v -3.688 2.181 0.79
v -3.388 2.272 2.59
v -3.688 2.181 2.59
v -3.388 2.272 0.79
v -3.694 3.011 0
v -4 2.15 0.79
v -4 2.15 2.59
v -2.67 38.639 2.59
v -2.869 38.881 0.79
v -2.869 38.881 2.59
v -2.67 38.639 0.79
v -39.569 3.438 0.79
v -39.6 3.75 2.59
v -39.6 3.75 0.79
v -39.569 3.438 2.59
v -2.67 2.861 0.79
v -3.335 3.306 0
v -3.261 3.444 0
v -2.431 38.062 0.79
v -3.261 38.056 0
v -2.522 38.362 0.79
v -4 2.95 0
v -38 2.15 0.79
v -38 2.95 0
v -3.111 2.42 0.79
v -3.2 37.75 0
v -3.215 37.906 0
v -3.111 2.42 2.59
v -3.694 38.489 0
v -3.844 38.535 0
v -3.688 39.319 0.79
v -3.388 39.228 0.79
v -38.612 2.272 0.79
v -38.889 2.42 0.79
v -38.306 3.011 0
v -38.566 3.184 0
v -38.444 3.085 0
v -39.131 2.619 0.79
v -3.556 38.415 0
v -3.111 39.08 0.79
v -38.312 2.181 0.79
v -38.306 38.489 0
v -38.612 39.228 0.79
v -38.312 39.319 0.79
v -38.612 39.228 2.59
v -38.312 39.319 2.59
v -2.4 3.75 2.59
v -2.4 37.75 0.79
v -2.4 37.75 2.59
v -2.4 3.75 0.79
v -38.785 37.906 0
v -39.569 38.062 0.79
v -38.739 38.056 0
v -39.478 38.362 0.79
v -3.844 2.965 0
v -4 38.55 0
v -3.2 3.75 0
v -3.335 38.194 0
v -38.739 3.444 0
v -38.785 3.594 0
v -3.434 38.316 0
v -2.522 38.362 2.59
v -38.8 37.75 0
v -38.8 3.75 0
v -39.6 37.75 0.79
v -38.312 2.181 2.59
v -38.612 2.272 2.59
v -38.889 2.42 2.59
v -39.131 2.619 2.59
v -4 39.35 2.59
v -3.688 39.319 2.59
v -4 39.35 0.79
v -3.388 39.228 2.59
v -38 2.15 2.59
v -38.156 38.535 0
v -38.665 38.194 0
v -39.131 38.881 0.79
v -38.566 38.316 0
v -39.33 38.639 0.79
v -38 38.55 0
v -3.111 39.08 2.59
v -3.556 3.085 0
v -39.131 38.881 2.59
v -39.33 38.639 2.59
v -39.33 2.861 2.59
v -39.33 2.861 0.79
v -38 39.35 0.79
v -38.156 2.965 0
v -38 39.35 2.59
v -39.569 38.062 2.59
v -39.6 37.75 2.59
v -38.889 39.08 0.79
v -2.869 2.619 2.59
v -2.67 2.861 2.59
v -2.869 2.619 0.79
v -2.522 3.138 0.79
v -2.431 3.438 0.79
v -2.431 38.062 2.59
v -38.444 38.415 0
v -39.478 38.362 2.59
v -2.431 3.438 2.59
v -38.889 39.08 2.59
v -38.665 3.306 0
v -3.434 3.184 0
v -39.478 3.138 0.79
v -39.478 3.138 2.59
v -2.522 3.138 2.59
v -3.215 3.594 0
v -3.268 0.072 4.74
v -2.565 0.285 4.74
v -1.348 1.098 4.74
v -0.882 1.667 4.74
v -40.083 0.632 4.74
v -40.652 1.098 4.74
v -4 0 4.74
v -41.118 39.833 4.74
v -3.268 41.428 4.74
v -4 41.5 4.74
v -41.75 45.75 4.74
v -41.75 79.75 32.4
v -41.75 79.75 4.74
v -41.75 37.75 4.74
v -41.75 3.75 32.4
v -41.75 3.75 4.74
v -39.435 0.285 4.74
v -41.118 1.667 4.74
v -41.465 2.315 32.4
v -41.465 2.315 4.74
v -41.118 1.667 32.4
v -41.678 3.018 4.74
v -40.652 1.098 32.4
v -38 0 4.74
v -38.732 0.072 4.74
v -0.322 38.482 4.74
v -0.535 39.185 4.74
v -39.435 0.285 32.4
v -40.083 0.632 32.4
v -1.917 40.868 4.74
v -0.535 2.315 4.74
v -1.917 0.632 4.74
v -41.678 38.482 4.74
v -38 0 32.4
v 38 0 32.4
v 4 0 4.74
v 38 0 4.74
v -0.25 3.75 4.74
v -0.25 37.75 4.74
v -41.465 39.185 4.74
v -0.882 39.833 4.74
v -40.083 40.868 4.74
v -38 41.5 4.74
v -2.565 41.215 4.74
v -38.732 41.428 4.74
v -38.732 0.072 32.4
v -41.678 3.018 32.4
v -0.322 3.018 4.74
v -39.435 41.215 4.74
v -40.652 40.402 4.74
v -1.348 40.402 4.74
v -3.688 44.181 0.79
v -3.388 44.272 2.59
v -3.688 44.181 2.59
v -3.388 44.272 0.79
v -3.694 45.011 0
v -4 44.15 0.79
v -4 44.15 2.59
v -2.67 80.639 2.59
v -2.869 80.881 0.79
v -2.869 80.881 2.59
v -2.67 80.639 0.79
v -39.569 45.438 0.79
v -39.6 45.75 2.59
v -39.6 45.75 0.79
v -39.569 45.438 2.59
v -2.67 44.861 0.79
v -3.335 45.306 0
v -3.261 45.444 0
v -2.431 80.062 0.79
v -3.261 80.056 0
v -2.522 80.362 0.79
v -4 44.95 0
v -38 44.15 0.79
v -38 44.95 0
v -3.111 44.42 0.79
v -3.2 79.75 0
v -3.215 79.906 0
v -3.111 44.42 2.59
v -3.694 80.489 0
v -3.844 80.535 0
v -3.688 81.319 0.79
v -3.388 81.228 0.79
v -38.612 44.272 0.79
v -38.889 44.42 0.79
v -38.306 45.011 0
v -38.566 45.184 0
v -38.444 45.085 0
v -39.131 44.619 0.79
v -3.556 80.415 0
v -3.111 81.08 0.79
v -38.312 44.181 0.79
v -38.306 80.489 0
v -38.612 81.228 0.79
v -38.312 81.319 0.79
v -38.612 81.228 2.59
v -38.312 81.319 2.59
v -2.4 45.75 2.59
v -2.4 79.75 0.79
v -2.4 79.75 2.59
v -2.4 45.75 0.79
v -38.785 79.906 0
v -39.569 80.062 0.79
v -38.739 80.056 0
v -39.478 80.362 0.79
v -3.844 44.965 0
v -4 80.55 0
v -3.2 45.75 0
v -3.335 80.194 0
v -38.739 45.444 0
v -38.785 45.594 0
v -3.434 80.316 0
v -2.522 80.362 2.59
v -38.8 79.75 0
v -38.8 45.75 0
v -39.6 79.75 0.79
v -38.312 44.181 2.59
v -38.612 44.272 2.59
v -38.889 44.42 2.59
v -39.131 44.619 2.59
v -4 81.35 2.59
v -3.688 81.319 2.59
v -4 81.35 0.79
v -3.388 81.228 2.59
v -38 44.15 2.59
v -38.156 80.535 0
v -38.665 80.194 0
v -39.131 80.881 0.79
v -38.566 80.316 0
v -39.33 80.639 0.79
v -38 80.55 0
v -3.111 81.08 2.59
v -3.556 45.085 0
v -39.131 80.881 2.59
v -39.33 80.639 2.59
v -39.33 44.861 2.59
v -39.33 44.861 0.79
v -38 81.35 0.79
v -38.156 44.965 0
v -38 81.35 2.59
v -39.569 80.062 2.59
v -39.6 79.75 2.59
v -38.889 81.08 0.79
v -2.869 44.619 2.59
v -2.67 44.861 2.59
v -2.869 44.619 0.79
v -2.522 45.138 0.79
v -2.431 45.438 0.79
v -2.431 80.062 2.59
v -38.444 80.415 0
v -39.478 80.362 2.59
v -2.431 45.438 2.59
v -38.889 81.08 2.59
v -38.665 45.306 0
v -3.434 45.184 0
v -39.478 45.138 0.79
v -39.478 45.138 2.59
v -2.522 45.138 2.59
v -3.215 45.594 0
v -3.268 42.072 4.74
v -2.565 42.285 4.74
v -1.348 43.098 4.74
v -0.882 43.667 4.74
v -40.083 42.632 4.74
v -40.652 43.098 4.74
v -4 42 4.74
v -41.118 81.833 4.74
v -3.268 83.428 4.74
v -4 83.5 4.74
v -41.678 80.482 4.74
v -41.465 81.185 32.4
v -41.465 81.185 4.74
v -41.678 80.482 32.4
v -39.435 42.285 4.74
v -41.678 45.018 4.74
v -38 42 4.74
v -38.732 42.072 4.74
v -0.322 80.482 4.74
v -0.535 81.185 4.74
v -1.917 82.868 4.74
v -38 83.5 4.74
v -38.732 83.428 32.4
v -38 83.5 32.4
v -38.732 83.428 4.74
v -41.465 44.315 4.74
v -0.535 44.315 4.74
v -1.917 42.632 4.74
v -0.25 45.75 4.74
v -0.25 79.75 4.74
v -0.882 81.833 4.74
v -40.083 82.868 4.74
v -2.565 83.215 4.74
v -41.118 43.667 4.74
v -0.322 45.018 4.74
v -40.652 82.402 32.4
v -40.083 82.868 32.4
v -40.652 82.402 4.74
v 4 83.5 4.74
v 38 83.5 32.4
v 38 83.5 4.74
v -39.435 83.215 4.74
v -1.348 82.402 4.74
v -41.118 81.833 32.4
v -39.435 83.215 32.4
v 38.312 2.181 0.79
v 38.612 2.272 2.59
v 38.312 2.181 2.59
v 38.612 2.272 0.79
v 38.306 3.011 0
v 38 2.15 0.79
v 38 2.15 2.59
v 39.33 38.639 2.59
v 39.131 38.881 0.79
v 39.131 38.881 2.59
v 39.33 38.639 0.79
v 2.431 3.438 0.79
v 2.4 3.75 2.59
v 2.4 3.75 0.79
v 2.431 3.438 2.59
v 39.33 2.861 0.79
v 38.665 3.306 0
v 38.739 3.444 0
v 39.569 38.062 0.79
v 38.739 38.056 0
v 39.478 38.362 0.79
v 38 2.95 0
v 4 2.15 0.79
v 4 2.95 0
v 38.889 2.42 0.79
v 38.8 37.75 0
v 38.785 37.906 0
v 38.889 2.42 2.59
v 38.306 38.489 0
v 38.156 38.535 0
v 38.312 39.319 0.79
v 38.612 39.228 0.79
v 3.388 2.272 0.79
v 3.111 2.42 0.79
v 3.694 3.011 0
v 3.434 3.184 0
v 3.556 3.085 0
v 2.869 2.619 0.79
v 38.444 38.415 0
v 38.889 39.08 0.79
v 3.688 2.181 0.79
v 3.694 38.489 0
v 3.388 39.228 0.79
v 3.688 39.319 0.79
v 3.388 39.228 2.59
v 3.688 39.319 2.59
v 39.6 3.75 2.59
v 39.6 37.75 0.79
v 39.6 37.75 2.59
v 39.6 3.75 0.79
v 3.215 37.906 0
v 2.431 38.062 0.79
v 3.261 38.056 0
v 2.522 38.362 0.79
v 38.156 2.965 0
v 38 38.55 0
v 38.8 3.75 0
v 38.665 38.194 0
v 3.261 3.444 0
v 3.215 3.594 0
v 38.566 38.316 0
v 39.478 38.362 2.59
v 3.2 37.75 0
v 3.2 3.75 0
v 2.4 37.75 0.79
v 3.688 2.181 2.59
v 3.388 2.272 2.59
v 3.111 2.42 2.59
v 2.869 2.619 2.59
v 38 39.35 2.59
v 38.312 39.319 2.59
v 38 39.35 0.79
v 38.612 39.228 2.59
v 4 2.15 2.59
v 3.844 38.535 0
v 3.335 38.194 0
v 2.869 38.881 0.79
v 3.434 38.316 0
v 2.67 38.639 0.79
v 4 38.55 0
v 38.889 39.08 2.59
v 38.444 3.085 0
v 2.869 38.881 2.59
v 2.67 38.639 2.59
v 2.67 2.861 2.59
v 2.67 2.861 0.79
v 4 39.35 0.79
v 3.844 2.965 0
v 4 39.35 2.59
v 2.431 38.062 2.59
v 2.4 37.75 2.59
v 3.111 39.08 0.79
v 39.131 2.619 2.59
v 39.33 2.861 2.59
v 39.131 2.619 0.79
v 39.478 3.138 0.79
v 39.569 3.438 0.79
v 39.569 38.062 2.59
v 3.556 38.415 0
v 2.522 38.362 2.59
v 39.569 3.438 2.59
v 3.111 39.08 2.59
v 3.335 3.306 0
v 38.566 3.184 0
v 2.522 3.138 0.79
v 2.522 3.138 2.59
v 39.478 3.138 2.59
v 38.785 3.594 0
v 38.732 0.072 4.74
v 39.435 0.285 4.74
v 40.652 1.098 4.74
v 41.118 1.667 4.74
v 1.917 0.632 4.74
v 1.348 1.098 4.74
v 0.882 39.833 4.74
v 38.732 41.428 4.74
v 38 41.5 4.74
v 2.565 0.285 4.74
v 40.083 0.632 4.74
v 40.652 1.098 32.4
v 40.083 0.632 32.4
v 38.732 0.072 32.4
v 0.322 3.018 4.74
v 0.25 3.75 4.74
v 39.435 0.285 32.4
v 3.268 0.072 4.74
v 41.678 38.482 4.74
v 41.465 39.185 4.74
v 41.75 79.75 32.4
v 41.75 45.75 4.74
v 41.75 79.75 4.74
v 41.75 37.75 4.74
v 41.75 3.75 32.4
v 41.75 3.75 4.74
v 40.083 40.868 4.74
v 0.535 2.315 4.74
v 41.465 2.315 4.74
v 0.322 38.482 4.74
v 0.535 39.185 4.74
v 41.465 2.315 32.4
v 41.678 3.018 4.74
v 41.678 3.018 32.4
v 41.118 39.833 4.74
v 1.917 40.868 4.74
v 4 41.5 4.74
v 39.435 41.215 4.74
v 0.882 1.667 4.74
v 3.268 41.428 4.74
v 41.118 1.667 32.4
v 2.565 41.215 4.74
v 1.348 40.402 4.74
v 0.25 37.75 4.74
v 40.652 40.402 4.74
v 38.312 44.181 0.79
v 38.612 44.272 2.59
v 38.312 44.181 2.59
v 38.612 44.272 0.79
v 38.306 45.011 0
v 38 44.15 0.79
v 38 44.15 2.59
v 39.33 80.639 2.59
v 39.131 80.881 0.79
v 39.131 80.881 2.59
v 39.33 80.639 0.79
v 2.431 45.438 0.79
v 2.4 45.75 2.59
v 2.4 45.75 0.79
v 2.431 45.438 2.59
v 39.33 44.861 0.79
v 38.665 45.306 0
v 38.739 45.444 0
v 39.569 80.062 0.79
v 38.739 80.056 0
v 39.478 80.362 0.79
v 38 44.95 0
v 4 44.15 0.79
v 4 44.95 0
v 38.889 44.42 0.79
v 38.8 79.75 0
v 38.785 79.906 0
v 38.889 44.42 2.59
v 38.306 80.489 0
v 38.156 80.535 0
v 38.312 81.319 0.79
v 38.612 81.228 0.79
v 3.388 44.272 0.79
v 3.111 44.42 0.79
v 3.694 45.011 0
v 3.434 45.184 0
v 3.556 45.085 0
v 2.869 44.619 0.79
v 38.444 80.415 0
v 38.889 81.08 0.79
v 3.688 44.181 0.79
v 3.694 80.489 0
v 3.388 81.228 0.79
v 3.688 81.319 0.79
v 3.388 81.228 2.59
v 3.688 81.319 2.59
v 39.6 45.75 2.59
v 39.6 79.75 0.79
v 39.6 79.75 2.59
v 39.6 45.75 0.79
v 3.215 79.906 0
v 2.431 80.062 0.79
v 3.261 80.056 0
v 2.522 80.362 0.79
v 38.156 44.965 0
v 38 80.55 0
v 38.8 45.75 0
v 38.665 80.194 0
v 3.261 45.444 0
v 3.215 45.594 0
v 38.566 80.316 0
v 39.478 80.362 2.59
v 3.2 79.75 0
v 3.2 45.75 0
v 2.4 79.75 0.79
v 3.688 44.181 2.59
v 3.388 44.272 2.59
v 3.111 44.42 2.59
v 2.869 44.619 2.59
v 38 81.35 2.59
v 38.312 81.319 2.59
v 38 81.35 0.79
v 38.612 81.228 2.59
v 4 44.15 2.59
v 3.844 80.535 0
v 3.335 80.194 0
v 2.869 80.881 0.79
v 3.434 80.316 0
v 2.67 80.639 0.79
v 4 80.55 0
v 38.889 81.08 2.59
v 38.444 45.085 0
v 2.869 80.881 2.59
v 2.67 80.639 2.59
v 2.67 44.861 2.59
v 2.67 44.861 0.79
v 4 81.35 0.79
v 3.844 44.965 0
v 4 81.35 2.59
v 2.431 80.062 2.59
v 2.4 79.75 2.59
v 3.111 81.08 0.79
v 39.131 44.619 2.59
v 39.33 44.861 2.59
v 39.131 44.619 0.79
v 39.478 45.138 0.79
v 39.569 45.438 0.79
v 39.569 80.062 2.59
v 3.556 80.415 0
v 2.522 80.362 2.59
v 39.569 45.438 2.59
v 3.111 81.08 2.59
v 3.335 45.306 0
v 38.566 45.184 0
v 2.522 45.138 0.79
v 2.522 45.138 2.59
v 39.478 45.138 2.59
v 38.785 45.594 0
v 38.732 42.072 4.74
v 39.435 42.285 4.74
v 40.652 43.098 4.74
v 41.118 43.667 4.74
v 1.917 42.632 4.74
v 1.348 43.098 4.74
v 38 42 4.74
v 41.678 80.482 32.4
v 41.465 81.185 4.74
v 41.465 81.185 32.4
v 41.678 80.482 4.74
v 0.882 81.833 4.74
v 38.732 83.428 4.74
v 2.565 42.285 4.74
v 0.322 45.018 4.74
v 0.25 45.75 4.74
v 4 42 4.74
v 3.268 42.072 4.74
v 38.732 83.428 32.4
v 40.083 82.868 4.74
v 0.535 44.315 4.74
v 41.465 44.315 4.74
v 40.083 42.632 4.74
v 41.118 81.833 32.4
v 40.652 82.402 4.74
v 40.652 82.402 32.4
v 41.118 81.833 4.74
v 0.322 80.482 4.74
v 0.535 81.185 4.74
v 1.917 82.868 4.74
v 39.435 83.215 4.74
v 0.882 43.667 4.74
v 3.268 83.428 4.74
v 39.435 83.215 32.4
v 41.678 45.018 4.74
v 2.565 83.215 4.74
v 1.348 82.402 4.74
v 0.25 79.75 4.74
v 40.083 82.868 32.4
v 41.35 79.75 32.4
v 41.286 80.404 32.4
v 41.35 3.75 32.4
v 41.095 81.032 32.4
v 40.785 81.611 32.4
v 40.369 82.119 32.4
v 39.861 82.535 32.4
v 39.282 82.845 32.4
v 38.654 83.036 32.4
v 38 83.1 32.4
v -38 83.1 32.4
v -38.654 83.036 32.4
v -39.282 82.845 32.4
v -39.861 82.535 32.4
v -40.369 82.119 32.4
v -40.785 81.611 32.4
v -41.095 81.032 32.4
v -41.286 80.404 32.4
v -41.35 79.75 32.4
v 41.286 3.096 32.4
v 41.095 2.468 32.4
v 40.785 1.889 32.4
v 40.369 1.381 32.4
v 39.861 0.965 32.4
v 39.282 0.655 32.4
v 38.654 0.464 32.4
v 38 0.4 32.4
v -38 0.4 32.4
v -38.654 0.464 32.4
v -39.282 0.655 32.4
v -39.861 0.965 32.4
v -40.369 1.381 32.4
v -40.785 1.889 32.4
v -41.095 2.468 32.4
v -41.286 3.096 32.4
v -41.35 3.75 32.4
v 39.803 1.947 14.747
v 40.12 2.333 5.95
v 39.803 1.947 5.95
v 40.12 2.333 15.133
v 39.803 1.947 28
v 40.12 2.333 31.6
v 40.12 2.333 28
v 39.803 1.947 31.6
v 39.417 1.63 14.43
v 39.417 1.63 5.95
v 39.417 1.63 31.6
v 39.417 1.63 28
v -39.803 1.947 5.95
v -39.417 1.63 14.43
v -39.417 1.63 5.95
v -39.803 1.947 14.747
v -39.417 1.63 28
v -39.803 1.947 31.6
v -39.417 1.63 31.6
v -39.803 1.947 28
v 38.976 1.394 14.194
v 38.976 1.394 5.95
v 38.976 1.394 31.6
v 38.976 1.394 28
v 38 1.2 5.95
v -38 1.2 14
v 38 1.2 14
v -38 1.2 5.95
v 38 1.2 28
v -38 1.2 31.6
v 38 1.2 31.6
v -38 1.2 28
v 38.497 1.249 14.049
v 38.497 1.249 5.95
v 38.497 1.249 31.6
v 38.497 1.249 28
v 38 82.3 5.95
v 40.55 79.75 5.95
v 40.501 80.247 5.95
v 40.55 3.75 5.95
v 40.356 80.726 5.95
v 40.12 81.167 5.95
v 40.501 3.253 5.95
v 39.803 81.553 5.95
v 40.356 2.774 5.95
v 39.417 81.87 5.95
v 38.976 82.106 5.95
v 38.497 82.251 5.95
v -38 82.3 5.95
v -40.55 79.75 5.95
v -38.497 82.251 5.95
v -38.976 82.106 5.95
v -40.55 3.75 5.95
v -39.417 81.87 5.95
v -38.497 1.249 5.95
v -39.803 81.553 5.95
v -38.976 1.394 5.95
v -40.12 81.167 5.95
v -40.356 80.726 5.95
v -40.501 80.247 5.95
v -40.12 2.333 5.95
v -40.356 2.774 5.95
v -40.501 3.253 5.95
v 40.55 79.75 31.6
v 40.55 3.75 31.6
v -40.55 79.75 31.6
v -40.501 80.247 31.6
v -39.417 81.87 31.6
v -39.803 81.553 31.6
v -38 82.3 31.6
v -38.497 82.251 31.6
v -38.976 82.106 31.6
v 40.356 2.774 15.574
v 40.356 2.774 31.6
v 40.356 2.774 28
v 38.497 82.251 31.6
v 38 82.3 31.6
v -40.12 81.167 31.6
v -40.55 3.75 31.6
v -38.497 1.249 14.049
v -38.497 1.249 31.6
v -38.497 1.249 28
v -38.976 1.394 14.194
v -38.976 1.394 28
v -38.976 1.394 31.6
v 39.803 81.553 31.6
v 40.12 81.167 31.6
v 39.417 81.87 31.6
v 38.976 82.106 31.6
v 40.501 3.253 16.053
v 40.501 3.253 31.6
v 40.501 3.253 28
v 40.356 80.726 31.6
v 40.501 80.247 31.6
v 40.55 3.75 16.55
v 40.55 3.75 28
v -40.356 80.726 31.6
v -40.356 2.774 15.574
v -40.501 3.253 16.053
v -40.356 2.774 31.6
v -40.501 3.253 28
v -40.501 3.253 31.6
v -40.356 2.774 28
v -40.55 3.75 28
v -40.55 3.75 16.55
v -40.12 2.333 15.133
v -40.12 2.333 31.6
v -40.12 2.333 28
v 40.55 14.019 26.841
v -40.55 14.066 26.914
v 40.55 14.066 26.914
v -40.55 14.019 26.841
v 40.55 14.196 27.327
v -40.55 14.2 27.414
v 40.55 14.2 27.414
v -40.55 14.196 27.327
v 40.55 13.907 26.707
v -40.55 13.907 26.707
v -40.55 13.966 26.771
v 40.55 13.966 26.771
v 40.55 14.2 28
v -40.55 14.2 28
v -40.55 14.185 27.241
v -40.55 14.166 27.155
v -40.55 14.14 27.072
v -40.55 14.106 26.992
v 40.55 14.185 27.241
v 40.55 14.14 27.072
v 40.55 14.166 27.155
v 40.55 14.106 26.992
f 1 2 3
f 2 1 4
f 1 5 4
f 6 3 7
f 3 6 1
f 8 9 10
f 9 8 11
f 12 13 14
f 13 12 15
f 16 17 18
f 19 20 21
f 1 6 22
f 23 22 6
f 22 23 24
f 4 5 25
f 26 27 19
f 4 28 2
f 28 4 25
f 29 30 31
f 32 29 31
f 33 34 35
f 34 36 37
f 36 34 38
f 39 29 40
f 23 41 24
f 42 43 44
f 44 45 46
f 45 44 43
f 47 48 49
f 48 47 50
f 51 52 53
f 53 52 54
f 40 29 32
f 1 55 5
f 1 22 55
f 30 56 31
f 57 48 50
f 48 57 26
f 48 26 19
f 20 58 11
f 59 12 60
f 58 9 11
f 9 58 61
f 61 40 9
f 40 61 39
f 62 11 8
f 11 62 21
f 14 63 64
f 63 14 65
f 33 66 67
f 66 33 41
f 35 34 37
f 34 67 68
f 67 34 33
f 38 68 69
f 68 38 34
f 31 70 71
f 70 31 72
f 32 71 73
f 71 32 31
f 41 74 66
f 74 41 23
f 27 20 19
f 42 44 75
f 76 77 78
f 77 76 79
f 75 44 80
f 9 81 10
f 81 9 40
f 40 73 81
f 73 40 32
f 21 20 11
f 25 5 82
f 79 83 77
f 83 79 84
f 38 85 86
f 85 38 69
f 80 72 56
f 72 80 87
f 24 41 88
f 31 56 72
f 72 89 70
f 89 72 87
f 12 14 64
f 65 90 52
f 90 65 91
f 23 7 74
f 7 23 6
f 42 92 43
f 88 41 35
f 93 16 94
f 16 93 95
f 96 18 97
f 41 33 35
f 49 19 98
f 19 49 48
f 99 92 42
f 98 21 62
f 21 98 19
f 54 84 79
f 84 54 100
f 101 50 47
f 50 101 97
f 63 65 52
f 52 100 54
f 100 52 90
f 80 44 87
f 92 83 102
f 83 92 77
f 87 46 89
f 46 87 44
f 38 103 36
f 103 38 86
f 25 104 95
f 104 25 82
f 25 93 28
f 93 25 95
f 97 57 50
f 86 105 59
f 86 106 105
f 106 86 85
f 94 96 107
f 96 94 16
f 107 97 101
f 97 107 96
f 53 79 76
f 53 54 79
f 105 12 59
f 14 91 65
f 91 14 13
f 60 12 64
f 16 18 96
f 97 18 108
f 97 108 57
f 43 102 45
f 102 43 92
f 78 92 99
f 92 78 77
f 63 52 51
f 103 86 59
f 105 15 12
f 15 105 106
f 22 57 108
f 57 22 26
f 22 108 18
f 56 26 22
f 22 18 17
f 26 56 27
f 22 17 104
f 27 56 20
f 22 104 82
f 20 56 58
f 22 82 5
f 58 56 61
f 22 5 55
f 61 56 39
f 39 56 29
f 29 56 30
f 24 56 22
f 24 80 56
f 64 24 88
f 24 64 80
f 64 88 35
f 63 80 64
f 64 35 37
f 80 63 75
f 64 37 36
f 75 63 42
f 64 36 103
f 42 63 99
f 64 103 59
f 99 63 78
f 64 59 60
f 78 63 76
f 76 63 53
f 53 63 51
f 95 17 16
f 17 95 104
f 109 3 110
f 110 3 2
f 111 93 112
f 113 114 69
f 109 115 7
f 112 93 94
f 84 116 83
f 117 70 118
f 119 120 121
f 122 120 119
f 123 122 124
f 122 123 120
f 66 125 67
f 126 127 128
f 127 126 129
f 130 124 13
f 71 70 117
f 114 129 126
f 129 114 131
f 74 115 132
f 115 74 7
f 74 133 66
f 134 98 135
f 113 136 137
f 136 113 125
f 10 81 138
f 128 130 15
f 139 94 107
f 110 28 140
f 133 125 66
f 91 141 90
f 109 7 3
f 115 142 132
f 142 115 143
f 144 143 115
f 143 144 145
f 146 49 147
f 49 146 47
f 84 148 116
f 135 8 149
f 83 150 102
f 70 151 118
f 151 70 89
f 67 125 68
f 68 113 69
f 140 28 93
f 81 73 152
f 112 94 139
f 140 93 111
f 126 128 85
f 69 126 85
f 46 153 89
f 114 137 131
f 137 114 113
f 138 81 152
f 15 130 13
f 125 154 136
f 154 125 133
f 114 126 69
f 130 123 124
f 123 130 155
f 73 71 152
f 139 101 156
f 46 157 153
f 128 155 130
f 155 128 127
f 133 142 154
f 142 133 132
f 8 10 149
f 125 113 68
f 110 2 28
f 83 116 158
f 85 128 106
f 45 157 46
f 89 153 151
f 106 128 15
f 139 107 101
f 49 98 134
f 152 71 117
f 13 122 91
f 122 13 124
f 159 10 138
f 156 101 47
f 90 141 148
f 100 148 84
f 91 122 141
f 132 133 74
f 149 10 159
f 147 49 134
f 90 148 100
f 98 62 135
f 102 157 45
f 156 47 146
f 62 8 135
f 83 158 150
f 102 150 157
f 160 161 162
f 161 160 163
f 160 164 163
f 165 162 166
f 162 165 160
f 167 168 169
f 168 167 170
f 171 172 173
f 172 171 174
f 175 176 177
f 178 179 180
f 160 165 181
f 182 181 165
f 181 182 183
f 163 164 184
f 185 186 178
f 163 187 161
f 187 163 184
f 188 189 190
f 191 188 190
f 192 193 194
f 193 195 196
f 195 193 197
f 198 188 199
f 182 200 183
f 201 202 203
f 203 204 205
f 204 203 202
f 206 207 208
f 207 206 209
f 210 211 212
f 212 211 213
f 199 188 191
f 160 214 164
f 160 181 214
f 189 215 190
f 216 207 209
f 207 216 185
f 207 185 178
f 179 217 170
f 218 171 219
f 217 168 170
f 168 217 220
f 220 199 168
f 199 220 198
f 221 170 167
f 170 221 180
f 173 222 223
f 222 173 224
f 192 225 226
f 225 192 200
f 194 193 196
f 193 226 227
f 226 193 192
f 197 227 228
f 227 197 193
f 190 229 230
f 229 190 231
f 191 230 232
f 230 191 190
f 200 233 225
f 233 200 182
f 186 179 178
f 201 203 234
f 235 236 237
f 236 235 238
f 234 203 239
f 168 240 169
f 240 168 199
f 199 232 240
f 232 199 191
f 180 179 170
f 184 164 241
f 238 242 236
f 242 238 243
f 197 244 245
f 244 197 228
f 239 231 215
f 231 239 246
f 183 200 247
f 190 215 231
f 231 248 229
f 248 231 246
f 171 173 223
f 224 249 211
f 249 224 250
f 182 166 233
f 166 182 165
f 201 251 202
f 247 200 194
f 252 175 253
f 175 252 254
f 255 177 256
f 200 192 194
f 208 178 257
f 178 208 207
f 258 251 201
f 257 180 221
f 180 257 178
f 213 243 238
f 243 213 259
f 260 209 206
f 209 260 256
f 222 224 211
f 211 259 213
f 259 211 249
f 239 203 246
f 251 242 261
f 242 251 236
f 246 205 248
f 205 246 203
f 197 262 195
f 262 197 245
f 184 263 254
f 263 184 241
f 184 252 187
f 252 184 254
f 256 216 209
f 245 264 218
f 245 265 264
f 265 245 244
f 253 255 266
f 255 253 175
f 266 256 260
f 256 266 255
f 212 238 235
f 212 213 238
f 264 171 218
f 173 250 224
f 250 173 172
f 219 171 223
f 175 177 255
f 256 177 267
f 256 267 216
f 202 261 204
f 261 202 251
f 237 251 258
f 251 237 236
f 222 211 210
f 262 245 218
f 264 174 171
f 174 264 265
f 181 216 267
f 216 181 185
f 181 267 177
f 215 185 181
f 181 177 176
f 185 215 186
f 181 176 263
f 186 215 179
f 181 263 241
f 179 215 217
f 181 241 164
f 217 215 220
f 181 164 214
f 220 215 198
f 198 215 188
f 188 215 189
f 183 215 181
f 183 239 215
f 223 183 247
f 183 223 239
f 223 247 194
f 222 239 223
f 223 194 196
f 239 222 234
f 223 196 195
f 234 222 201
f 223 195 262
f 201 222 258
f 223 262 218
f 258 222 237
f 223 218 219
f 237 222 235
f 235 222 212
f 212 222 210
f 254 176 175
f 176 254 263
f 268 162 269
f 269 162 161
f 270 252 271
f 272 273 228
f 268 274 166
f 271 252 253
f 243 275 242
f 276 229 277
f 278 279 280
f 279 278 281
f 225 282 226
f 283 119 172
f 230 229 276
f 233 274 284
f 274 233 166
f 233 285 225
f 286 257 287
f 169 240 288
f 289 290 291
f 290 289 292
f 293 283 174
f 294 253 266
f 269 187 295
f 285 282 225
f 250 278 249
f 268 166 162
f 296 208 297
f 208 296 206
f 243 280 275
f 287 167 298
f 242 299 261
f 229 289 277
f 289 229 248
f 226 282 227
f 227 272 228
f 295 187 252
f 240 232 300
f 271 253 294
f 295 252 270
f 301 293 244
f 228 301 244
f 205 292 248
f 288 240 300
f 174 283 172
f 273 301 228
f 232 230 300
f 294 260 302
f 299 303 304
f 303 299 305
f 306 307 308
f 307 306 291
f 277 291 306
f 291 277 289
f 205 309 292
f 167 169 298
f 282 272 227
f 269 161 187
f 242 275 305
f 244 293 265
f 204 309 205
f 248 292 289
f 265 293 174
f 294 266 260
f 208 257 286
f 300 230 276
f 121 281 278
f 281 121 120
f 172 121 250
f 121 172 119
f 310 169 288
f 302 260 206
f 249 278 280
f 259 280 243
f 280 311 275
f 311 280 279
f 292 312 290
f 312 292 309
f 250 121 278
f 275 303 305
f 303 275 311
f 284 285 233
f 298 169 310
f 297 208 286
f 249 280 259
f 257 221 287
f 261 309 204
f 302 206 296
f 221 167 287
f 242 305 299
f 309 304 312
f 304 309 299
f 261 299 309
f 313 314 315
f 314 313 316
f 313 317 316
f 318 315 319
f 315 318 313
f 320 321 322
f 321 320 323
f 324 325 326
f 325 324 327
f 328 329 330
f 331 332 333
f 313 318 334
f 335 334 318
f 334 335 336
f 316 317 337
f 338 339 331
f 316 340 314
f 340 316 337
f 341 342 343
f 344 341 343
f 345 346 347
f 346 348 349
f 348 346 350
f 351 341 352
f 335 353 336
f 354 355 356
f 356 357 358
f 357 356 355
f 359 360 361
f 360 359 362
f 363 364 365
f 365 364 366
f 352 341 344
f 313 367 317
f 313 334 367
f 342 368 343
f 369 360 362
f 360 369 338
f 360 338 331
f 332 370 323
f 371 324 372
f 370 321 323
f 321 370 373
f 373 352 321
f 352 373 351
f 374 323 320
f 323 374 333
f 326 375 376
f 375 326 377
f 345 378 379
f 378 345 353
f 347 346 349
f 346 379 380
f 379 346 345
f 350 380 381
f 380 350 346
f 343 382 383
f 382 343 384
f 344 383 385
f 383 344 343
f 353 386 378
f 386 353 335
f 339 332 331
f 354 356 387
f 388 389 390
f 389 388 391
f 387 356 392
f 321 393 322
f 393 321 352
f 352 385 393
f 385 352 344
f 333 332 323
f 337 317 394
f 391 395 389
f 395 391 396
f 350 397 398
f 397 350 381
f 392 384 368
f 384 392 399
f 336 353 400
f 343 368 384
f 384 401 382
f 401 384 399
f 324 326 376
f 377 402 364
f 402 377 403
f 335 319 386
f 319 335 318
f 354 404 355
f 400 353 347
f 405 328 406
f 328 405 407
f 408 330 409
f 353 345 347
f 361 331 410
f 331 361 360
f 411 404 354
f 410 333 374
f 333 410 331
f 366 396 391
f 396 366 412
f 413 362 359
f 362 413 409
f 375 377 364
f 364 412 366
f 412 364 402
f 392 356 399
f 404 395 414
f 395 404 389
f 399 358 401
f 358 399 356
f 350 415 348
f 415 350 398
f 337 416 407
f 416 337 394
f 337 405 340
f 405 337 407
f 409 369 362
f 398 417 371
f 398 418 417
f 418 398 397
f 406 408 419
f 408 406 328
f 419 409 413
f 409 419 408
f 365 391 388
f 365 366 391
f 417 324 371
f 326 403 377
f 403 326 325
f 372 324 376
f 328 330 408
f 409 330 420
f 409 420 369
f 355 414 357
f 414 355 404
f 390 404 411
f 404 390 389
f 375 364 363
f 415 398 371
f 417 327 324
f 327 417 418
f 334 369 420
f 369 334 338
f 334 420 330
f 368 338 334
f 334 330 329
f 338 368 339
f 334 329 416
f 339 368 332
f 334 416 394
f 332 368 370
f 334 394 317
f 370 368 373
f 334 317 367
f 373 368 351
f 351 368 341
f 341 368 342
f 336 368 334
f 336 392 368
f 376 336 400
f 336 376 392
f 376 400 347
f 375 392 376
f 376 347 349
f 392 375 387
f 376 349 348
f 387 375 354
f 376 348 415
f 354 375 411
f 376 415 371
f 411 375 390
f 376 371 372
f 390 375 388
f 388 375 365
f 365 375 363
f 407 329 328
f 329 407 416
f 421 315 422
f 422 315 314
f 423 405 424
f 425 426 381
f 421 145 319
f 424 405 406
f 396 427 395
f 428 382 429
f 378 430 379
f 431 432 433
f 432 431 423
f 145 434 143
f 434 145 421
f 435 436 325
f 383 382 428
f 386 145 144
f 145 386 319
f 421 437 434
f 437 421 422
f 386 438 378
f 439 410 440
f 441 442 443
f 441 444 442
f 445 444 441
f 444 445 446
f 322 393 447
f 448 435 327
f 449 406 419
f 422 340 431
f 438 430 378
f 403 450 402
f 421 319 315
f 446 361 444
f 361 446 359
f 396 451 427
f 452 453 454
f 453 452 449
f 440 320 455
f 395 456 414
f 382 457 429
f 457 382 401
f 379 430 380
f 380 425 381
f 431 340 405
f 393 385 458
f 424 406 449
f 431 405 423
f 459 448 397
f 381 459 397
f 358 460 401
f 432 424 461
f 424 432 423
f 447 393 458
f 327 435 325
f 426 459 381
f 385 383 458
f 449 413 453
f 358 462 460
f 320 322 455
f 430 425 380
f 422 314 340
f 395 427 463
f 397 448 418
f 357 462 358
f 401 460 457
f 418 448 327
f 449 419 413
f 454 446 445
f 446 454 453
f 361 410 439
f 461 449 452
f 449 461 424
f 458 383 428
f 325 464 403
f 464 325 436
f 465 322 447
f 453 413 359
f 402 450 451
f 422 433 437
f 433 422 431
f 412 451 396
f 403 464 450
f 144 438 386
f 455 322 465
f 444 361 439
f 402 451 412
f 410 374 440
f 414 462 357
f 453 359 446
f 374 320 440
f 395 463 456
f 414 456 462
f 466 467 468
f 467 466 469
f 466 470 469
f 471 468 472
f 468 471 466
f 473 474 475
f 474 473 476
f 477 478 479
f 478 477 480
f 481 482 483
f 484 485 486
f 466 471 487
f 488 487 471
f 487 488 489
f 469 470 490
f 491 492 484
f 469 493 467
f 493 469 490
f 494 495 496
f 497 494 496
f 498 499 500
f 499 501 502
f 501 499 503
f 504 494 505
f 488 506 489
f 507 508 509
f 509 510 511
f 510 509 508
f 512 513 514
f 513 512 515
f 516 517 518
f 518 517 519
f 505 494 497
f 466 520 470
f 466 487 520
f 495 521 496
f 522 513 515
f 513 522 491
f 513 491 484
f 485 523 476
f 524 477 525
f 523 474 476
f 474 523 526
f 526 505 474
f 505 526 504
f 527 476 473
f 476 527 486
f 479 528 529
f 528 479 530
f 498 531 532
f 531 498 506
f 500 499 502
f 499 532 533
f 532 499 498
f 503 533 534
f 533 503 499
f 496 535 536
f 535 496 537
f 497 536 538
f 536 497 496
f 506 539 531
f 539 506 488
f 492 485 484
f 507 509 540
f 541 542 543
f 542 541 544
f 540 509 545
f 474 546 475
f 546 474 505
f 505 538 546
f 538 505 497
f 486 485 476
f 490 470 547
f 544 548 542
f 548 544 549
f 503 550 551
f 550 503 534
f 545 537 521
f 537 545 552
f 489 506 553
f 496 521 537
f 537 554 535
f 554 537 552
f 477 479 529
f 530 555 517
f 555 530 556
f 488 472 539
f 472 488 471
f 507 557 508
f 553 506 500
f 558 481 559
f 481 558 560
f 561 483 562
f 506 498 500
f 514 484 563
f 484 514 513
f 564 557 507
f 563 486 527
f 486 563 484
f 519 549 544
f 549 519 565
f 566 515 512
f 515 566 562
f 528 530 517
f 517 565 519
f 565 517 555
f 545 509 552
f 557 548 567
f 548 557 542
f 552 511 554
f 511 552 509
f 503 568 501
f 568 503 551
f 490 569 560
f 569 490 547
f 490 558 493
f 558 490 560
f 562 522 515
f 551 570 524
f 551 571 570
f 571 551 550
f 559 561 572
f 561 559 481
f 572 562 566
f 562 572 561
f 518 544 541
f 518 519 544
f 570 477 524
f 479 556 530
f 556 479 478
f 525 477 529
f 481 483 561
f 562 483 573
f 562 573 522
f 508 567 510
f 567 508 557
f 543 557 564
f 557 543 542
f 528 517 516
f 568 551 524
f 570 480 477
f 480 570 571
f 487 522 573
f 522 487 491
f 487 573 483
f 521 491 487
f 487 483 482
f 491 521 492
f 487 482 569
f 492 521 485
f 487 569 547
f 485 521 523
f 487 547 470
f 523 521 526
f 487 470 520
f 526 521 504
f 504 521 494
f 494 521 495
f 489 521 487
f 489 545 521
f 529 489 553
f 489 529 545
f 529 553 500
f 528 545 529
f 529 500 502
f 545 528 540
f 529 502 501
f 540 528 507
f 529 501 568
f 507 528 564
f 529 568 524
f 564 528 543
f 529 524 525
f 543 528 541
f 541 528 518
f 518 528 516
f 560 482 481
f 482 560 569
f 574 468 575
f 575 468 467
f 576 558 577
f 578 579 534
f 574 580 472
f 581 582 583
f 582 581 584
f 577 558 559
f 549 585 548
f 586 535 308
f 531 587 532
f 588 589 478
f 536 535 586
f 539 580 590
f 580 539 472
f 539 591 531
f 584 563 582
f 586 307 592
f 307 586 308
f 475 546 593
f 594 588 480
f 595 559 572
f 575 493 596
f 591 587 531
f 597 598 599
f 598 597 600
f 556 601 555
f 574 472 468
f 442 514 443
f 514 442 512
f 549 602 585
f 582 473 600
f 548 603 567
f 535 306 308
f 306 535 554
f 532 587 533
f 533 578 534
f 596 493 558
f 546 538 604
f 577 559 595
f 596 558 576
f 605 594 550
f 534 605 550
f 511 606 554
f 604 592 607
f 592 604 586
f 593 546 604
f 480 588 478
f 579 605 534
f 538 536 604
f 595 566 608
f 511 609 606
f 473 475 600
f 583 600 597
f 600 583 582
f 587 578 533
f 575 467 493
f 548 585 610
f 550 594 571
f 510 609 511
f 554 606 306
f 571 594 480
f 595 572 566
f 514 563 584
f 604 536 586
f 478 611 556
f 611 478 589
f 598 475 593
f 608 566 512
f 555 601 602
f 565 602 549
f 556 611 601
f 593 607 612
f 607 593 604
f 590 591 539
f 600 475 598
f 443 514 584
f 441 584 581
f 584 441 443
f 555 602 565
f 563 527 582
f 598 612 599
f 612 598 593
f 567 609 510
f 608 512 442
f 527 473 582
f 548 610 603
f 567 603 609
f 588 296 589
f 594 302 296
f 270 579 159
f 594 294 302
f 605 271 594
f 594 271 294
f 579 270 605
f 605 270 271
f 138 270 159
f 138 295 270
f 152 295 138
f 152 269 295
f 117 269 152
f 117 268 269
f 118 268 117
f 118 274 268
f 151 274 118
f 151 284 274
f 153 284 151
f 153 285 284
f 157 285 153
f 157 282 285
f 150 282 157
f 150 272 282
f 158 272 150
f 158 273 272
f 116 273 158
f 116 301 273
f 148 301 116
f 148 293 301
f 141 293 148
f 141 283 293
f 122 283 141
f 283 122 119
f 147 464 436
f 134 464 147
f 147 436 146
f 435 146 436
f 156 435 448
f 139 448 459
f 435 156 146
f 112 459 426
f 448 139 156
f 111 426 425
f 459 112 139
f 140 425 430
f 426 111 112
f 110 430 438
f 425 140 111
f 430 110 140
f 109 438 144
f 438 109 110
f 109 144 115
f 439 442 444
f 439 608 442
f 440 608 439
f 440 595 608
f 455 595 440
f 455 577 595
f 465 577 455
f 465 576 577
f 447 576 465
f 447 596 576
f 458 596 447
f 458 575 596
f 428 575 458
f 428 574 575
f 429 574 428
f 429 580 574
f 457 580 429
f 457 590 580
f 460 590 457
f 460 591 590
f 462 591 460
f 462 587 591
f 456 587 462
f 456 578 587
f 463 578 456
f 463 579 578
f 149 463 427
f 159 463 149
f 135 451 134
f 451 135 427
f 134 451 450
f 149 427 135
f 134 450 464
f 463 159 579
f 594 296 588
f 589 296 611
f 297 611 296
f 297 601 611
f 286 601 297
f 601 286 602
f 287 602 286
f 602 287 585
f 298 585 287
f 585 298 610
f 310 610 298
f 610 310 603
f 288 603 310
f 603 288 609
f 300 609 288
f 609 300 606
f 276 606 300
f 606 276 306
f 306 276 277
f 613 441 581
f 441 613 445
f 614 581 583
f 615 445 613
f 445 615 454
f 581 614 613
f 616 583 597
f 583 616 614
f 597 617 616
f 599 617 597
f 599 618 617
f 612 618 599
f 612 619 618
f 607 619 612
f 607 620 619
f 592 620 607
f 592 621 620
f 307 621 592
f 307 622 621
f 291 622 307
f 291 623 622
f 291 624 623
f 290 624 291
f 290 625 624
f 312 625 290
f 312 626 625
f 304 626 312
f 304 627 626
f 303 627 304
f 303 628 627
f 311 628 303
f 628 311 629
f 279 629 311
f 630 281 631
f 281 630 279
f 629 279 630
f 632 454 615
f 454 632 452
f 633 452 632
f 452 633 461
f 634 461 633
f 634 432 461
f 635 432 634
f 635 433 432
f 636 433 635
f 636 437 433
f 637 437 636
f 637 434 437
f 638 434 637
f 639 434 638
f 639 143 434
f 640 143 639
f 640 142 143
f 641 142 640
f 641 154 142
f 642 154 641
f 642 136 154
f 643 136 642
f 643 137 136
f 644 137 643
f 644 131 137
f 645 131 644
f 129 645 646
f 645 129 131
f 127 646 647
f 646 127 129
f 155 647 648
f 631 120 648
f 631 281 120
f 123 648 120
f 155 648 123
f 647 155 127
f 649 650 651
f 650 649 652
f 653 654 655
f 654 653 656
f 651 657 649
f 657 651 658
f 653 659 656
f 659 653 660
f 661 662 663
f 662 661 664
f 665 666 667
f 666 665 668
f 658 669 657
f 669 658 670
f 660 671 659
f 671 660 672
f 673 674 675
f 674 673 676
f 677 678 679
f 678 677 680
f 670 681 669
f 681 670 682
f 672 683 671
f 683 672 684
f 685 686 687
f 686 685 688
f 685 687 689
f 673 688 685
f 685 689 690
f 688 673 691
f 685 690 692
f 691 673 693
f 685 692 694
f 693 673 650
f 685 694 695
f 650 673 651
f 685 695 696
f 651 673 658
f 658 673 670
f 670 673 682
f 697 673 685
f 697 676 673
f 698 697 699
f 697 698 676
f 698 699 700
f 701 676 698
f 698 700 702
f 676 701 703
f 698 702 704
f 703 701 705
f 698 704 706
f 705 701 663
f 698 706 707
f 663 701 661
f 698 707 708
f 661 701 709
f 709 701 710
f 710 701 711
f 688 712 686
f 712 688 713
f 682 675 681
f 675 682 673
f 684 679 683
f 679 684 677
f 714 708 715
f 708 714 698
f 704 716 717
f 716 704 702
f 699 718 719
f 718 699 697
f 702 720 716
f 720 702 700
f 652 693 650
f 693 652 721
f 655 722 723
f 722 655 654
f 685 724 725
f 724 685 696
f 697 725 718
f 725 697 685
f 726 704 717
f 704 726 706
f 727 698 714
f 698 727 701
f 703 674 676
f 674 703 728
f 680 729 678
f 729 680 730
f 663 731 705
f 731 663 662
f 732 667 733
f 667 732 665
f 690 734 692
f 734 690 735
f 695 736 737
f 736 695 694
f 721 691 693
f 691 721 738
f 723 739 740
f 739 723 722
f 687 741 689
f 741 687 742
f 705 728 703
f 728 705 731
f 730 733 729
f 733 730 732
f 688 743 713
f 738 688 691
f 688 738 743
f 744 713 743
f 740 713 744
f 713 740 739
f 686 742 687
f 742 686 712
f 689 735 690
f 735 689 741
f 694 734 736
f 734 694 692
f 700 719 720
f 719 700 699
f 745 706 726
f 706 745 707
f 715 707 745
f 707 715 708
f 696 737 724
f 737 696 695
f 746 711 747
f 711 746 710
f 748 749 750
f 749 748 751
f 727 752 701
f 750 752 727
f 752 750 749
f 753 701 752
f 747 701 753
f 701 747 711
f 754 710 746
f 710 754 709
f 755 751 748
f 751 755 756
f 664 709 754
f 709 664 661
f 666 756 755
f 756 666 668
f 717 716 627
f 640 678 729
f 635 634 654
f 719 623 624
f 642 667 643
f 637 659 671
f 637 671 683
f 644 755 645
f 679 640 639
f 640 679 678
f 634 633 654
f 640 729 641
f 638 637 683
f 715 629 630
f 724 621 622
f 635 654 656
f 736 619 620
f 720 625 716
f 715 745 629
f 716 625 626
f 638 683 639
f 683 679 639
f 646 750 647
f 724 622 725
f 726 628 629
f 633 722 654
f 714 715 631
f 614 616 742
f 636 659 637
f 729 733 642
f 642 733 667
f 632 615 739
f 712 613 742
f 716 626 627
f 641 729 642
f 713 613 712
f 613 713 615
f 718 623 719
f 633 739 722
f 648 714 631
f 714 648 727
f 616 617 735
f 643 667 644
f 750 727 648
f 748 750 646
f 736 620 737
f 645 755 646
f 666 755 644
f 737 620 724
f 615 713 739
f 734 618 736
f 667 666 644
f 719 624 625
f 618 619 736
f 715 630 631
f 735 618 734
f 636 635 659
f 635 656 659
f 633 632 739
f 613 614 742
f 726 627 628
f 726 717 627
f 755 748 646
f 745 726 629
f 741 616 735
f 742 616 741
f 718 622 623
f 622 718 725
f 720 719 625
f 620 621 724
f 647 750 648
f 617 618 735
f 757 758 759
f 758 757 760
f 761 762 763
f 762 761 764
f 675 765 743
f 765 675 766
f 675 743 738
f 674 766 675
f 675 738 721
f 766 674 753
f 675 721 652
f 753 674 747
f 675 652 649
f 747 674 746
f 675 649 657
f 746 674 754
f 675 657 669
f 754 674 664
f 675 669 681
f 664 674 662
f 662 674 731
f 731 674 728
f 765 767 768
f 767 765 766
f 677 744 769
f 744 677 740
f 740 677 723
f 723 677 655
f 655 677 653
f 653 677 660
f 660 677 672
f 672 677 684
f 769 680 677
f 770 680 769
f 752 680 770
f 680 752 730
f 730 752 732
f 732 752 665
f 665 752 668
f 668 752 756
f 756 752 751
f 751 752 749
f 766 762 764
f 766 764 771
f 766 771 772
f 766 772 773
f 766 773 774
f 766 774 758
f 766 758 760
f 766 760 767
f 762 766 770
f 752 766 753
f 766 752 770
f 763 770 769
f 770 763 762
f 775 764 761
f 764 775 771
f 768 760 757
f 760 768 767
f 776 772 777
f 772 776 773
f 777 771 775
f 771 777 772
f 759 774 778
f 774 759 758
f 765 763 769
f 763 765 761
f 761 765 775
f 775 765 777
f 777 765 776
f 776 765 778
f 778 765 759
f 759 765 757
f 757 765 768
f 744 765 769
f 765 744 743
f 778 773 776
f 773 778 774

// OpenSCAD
// file: ../../modules/gridfinity.scad
// Gridfinity ベースプレートの共有 module。
// 寸法は Gridfinity 仕様 (Zack Freedman) の baseplate 輪郭に従う:
//   ピッチ 42、ソケット上端開口 41.5 (角 R4)、上から 45° 面取り 2.15 →
//   垂直 1.8 (37.2 角・R1.85) → 45° 面取り 0.7 → 底 35.8 角 (R1.15)。
//   ソケット深さ = 2.15 + 1.8 + 0.7 = 4.65。
//
// 座標系: X が列方向 (中央が 0)、Y が行方向 (板の前端が 0)、Z=0 が板の底面。
// 板の外形は grid とは独立に rim で与えるので、grid より大きい板 (縁付き) を
// 作れる。ソケットは rim=[left, right, front, back] の内側へ 42 ピッチで並ぶ。

gf_pitch = 42;
gf_socket_top = 41.5; // 上端開口
gf_socket_mid = 37.2; // 垂直部
gf_socket_bot = 35.8; // 底
gf_socket_r_top = 4;
gf_socket_r_mid = 1.85;
gf_socket_r_bot = 1.15;
gf_chamfer_top = 2.15;
gf_wall_h = 1.8;
gf_chamfer_bot = 0.7;
gf_socket_depth = gf_chamfer_top + gf_wall_h + gf_chamfer_bot; // 4.65
gf_fn = 32;
gf_eps = 0.01; // hull 用の薄板の厚さ
gf_over = 0.5; // 切削の抜き代

// 角丸正方形 (一辺 w、角 R)
module
gf_rounded_square(w, r)
{
    offset(r = r, $fn = gf_fn) square(w - 2 * r, center = true);
}

// 厚さ gf_eps の角丸正方形の薄板を z に置く (hull の骨)
module
gf_slab(w, r, z)
{
    translate([ 0, 0, z ]) linear_extrude(gf_eps) gf_rounded_square(w, r);
}

// ソケット1個の切削体。z=0 がソケットの底 (床の天面)、+Z へ 4.65 で天面に出る。
// clearance は嵌合の逃げで、輪郭を全周へ clearance だけ外へ出す (幅 +2c、角 R
// +c)。 既定 0 が Gridfinity の公称輪郭。深さとピッチは変えない
module
gf_socket_cut(clearance = 0)
{
    z1 = gf_chamfer_bot;
    z2 = z1 + gf_wall_h;
    z3 = gf_socket_depth;
    c = clearance;
    hull()
    {
        gf_slab(gf_socket_bot + 2 * c, gf_socket_r_bot + c, 0);
        gf_slab(gf_socket_mid + 2 * c, gf_socket_r_mid + c, z1 - gf_eps);
    }
    hull()
    {
        gf_slab(gf_socket_mid + 2 * c, gf_socket_r_mid + c, z1 - gf_eps);
        gf_slab(gf_socket_mid + 2 * c, gf_socket_r_mid + c, z2 - gf_eps);
    }
    hull()
    {
        gf_slab(gf_socket_mid + 2 * c, gf_socket_r_mid + c, z2 - gf_eps);
        gf_slab(gf_socket_top + 2 * c, gf_socket_r_top + c, z3 - gf_eps);
    }
    // 天面より上へ抜く (天面と同一平面の退化した面を残さない)
    gf_slab(gf_socket_top + 2 * c, gf_socket_r_top + c, z3 - gf_eps);
    translate([ 0, 0, z3 - gf_eps ]) linear_extrude(gf_over + gf_eps)
        gf_rounded_square(gf_socket_top + 2 * c, gf_socket_r_top + c);
}

// ベースプレート。cols x rows のソケットを床 floor_t の上に彫る。
// rim = [left, right, front, back] はソケット列の外側に残す縁の幅。
// 板の幅 = cols*42 + left + right、奥行き = rows*42 + front + back。
// clearance はソケットの嵌合の逃げ (gf_socket_cut を参照)。
module
gf_baseplate(cols, rows, rim = [ 0, 0, 0, 0 ], floor_t = 1, clearance = 0)
{
    grid_w = cols * gf_pitch;
    grid_d = rows * gf_pitch;
    plate_w = grid_w + rim[0] + rim[1];
    plate_d = grid_d + rim[2] + rim[3];
    x0 = -plate_w / 2 + rim[0]; // ソケット列の左端
    difference()
    {
        translate([ -plate_w / 2, 0, 0 ])
            cube([ plate_w, plate_d, floor_t + gf_socket_depth ]);
        for (c = [0:cols - 1], r = [0:rows - 1])
            translate([
                x0 + (c + 0.5) * gf_pitch,
                rim[2] + (r + 0.5) * gf_pitch,
                floor_t
            ]) gf_socket_cut(clearance);
    }
}
// file: ../../modules/gridfinity_bin.scad
include <gridfinity.scad>

// Gridfinity bin (箱) の共有 module。ピッチと角丸は gridfinity.scad
// と共有する。 底の輪郭は Gridfinity 仕様の bin base (下から):
//   35.6 角 (R0.8) → 45° 0.8 → 37.2 角 (R1.6) → 垂直 1.8 → 45° 2.15 → 41.5 角
//   (R3.75) 高さ 0.8 + 1.8 + 2.15 = 4.75。磁石穴・ネジ穴は持たない (無垢)
// 外形はピッチ − 0.5 (1 マス 41.5)、角 R3.75。高さ単位 7 (4U = 28 が壁の上端)。
// リップは「薄いリップ」: 壁 (1.2) をそのまま lip_h (4.4) 伸ばし、内側の上端を
// 45° に落とすだけ。内側に棚 (厚い肉) を持たないので、上に載せる bin は底の
// 面取りをこの 45° に座らせる。
//
// 座標系: X が列方向 (中央 0)、Y が行方向 (手前 = ラベル側が 0)、Z=0 が底面。

gfb_outer = gf_pitch - 0.5; // 41.5
gfb_outer_r = 3.75;
gfb_base_bot = 35.6;
gfb_base_bot_r = 0.8;
gfb_base_mid = 37.2;
gfb_base_mid_r = 1.6;
gfb_base_chamfer_bot = 0.8;
gfb_base_wall_h = 1.8;
gfb_base_chamfer_top = 2.15;
gfb_base_h =
    gfb_base_chamfer_bot + gfb_base_wall_h + gfb_base_chamfer_top; // 4.75
gfb_unit = 7;
gfb_lip_h = 4.4;
gfb_lip_chamfer = 0.8;

// bin 1 マスぶんの底 (無垢)。z=0 が底面、gfb_base_h で外形 41.5 角に達する
module
gfb_base_cell()
{
    z1 = gfb_base_chamfer_bot;
    z2 = z1 + gfb_base_wall_h;
    z3 = gfb_base_h;
    hull()
    {
        gf_slab(gfb_base_bot, gfb_base_bot_r, 0);
        gf_slab(gfb_base_mid, gfb_base_mid_r, z1 - gf_eps);
    }
    hull()
    {
        gf_slab(gfb_base_mid, gfb_base_mid_r, z1 - gf_eps);
        gf_slab(gfb_base_mid, gfb_base_mid_r, z2 - gf_eps);
    }
    hull()
    {
        gf_slab(gfb_base_mid, gfb_base_mid_r, z2 - gf_eps);
        gf_slab(gfb_outer, gfb_outer_r, z3 - gf_eps);
    }
}

// cols x rows の角丸矩形 (外形)
module
gfb_footprint(cols, rows, inset = 0)
{
    w = cols * gf_pitch - 0.5 - 2 * inset;
    d = rows * gf_pitch - 0.5 - 2 * inset;
    translate([ 0, d / 2 + inset ])
        gf_rounded_square_wd(w, d, gfb_outer_r - inset);
}

// 幅 w × 奥行き d の角丸矩形 (中心が原点)
module
gf_rounded_square_wd(w, d, r)
{
    offset(r = r, $fn = gf_fn) square([ w - 2 * r, d - 2 * r ], center = true);
}

// ラベル天板の Y-Z 断面 (y = 壁の内面からの距離、z = 高さ)。天板 (厚さ t) の
// 先端から 45° の斜面が壁まで下りる無垢のくさび。先端の垂直面と斜面の境目
// (135°) を半径 r で丸める: 円弧の中心は先端の角から (-r, r·tan22.5°)、接点は
// 垂直面上の角 + (0, r·tan22.5°) と斜面上の角 + 0.4142r·(-1,-1)。壁の内側へ
// 1 だけ食い込ませて胴体と溶かす
function gfb_label_profile(d, t, h, r) =
    let(y0 = d, z0 = h - t, cy = y0 - r, cz = z0 + r * tan(22.5))
        concat([ [ -1, h ], [ d, h ] ],
               [for (a = [0:-5:-45])[cy + r * cos(a), cz + r* sin(a)]],
               [[ -1, h - t - d - 1 ]]);

// bin 本体。units は高さ (U)。wall / floor_t は壁と床の厚さ。
// label_d > 0 なら手前 (y=0) の壁の上端 (z = units*7) と面一で内側へ label_d
// 張り出す厚さ label_t のラベル天板を付ける。天板の下は 45° の無垢のくさびが
// 壁まで下りる (ブリッジもリブも無い。中身はスライサのインフィル任せ)。
// 天板の先端と 45° 面の境目は半径 label_r で丸める
module
gfb_bin(cols,
        rows,
        units = 4,
        wall = 1.2,
        floor_t = 1.2,
        label_d = 0,
        label_t = 1,
        label_r = 1)
{
    h = units * gfb_unit; // 壁の上端
    top = h + gfb_lip_h;  // リップの上端
    inner_w = cols * gf_pitch - 0.5 - 2 * wall;
    floor_top = gfb_base_h + floor_t;
    union()
    {
        // 底: マスごとの無垢の base
        for (c = [0:cols - 1], r = [0:rows - 1])
            translate([
                (c - (cols - 1) / 2) * gf_pitch,
                (r + 0.5) * gf_pitch - 0.25,
                0
            ]) gfb_base_cell();
        // 胴体: base の上から top
        // まで。内側は床の上を抜く。リップの内側の上端は 45°
        difference()
        {
            translate([ 0, 0, gfb_base_h - gf_eps ])
                linear_extrude(top - gfb_base_h + gf_eps)
                    gfb_footprint(cols, rows);
            translate([ 0, 0, floor_top ])
                linear_extrude(top - floor_top + gf_over)
                    gfb_footprint(cols, rows, wall);
            // リップ内側の面取り: 上端で wall − 0.4 まで開く
            hull()
            {
                translate([ 0, 0, top - gfb_lip_chamfer ])
                    linear_extrude(gf_eps) gfb_footprint(cols, rows, wall);
                translate([ 0, 0, top ]) linear_extrude(gf_over)
                    gfb_footprint(cols, rows, wall - gfb_lip_chamfer);
            }
        }
        // ラベル天板と 45° くさび (内幅いっぱい、同じ断面)。壁へ 1 食い込ませた
        // 矩形の柱なので、角の丸み (R3.75) の外へ出ないよう外形で切り取る
        if (label_d > 0)
            intersection()
            {
                translate([ -inner_w / 2, wall, 0 ]) rotate([ 90, 0, 90 ])
                    linear_extrude(inner_w) polygon(
                        gfb_label_profile(label_d, label_t, h, label_r));
                linear_extrude(top) gfb_footprint(cols, rows);
            }
    }
}
// file: ../../modules/gridfinity_bin_4u.scad
include <gridfinity_bin.scad>

// assets/gridfinity-bin/ の bin 群の共通値と、サイズ 3 引数の払い出し口。
// 単体では何も描かない。設計の経緯と確定値は
// ledger/designs/gridfinity-bin-4u.md が正本。 保証する範囲は cols 1..2 ×
// rows 1..5 × units 4 (assets に並ぶ 10 種)。 cols が X (横)、rows が Y
// (ラベルの壁から奥へ)、units が高さ (7mm 単位)。
wall = 1.2;    // 0.4 ノズル 3 本
floor_t = 1.2; // 底 (4.75) の上に載せる床。床の天面 z = 5.95
label_d = 13;  // 12mm 幅のラベルシールを貼る天板の張り出し
label_t = 1; // 天板の厚さ (user 指定)。下は 45° の無垢のくさび
label_r = 1; // 天板の先端と 45° 面の境目の R (user 指定)

function bin_contract(cols, rows, units) = str("CONTRACT units=",
                                               units,
                                               " pitch=",
                                               gf_pitch,
                                               " outer=",
                                               gfb_outer,
                                               " h=",
                                               units* gfb_unit,
                                               " lip=",
                                               gfb_lip_h,
                                               " base=",
                                               gfb_base_bot,
                                               "/",
                                               gfb_base_mid,
                                               "/",
                                               gfb_outer,
                                               " base_h=",
                                               gfb_base_h,
                                               " wall=",
                                               wall,
                                               " floor_top=",
                                               gfb_base_h + floor_t,
                                               " label=",
                                               label_d,
                                               "x",
                                               label_t,
                                               " wedge=45 fillet=",
                                               label_r,
                                               " bin=",
                                               cols,
                                               "x",
                                               rows,
                                               " size=",
                                               cols* gf_pitch - 0.5,
                                               "x",
                                               rows* gf_pitch - 0.5);

// (cols, rows, units) でラベル付き bin を払い出す。例: gridfinity_bin(2, 4, 4)
module
gridfinity_bin(cols, rows, units = 4)
{
    echo(bin_contract(cols, rows, units));
    gfb_bin(cols, rows, units, wall, floor_t, label_d, label_t, label_r);
}
// main file
include <../../modules/gridfinity_bin_4u.scad>

// 2x2 マス、高さ 4U のラベル天板付き bin。ラベルは手前 (y=0) 側
gridfinity_bin(2, 2, 4);
